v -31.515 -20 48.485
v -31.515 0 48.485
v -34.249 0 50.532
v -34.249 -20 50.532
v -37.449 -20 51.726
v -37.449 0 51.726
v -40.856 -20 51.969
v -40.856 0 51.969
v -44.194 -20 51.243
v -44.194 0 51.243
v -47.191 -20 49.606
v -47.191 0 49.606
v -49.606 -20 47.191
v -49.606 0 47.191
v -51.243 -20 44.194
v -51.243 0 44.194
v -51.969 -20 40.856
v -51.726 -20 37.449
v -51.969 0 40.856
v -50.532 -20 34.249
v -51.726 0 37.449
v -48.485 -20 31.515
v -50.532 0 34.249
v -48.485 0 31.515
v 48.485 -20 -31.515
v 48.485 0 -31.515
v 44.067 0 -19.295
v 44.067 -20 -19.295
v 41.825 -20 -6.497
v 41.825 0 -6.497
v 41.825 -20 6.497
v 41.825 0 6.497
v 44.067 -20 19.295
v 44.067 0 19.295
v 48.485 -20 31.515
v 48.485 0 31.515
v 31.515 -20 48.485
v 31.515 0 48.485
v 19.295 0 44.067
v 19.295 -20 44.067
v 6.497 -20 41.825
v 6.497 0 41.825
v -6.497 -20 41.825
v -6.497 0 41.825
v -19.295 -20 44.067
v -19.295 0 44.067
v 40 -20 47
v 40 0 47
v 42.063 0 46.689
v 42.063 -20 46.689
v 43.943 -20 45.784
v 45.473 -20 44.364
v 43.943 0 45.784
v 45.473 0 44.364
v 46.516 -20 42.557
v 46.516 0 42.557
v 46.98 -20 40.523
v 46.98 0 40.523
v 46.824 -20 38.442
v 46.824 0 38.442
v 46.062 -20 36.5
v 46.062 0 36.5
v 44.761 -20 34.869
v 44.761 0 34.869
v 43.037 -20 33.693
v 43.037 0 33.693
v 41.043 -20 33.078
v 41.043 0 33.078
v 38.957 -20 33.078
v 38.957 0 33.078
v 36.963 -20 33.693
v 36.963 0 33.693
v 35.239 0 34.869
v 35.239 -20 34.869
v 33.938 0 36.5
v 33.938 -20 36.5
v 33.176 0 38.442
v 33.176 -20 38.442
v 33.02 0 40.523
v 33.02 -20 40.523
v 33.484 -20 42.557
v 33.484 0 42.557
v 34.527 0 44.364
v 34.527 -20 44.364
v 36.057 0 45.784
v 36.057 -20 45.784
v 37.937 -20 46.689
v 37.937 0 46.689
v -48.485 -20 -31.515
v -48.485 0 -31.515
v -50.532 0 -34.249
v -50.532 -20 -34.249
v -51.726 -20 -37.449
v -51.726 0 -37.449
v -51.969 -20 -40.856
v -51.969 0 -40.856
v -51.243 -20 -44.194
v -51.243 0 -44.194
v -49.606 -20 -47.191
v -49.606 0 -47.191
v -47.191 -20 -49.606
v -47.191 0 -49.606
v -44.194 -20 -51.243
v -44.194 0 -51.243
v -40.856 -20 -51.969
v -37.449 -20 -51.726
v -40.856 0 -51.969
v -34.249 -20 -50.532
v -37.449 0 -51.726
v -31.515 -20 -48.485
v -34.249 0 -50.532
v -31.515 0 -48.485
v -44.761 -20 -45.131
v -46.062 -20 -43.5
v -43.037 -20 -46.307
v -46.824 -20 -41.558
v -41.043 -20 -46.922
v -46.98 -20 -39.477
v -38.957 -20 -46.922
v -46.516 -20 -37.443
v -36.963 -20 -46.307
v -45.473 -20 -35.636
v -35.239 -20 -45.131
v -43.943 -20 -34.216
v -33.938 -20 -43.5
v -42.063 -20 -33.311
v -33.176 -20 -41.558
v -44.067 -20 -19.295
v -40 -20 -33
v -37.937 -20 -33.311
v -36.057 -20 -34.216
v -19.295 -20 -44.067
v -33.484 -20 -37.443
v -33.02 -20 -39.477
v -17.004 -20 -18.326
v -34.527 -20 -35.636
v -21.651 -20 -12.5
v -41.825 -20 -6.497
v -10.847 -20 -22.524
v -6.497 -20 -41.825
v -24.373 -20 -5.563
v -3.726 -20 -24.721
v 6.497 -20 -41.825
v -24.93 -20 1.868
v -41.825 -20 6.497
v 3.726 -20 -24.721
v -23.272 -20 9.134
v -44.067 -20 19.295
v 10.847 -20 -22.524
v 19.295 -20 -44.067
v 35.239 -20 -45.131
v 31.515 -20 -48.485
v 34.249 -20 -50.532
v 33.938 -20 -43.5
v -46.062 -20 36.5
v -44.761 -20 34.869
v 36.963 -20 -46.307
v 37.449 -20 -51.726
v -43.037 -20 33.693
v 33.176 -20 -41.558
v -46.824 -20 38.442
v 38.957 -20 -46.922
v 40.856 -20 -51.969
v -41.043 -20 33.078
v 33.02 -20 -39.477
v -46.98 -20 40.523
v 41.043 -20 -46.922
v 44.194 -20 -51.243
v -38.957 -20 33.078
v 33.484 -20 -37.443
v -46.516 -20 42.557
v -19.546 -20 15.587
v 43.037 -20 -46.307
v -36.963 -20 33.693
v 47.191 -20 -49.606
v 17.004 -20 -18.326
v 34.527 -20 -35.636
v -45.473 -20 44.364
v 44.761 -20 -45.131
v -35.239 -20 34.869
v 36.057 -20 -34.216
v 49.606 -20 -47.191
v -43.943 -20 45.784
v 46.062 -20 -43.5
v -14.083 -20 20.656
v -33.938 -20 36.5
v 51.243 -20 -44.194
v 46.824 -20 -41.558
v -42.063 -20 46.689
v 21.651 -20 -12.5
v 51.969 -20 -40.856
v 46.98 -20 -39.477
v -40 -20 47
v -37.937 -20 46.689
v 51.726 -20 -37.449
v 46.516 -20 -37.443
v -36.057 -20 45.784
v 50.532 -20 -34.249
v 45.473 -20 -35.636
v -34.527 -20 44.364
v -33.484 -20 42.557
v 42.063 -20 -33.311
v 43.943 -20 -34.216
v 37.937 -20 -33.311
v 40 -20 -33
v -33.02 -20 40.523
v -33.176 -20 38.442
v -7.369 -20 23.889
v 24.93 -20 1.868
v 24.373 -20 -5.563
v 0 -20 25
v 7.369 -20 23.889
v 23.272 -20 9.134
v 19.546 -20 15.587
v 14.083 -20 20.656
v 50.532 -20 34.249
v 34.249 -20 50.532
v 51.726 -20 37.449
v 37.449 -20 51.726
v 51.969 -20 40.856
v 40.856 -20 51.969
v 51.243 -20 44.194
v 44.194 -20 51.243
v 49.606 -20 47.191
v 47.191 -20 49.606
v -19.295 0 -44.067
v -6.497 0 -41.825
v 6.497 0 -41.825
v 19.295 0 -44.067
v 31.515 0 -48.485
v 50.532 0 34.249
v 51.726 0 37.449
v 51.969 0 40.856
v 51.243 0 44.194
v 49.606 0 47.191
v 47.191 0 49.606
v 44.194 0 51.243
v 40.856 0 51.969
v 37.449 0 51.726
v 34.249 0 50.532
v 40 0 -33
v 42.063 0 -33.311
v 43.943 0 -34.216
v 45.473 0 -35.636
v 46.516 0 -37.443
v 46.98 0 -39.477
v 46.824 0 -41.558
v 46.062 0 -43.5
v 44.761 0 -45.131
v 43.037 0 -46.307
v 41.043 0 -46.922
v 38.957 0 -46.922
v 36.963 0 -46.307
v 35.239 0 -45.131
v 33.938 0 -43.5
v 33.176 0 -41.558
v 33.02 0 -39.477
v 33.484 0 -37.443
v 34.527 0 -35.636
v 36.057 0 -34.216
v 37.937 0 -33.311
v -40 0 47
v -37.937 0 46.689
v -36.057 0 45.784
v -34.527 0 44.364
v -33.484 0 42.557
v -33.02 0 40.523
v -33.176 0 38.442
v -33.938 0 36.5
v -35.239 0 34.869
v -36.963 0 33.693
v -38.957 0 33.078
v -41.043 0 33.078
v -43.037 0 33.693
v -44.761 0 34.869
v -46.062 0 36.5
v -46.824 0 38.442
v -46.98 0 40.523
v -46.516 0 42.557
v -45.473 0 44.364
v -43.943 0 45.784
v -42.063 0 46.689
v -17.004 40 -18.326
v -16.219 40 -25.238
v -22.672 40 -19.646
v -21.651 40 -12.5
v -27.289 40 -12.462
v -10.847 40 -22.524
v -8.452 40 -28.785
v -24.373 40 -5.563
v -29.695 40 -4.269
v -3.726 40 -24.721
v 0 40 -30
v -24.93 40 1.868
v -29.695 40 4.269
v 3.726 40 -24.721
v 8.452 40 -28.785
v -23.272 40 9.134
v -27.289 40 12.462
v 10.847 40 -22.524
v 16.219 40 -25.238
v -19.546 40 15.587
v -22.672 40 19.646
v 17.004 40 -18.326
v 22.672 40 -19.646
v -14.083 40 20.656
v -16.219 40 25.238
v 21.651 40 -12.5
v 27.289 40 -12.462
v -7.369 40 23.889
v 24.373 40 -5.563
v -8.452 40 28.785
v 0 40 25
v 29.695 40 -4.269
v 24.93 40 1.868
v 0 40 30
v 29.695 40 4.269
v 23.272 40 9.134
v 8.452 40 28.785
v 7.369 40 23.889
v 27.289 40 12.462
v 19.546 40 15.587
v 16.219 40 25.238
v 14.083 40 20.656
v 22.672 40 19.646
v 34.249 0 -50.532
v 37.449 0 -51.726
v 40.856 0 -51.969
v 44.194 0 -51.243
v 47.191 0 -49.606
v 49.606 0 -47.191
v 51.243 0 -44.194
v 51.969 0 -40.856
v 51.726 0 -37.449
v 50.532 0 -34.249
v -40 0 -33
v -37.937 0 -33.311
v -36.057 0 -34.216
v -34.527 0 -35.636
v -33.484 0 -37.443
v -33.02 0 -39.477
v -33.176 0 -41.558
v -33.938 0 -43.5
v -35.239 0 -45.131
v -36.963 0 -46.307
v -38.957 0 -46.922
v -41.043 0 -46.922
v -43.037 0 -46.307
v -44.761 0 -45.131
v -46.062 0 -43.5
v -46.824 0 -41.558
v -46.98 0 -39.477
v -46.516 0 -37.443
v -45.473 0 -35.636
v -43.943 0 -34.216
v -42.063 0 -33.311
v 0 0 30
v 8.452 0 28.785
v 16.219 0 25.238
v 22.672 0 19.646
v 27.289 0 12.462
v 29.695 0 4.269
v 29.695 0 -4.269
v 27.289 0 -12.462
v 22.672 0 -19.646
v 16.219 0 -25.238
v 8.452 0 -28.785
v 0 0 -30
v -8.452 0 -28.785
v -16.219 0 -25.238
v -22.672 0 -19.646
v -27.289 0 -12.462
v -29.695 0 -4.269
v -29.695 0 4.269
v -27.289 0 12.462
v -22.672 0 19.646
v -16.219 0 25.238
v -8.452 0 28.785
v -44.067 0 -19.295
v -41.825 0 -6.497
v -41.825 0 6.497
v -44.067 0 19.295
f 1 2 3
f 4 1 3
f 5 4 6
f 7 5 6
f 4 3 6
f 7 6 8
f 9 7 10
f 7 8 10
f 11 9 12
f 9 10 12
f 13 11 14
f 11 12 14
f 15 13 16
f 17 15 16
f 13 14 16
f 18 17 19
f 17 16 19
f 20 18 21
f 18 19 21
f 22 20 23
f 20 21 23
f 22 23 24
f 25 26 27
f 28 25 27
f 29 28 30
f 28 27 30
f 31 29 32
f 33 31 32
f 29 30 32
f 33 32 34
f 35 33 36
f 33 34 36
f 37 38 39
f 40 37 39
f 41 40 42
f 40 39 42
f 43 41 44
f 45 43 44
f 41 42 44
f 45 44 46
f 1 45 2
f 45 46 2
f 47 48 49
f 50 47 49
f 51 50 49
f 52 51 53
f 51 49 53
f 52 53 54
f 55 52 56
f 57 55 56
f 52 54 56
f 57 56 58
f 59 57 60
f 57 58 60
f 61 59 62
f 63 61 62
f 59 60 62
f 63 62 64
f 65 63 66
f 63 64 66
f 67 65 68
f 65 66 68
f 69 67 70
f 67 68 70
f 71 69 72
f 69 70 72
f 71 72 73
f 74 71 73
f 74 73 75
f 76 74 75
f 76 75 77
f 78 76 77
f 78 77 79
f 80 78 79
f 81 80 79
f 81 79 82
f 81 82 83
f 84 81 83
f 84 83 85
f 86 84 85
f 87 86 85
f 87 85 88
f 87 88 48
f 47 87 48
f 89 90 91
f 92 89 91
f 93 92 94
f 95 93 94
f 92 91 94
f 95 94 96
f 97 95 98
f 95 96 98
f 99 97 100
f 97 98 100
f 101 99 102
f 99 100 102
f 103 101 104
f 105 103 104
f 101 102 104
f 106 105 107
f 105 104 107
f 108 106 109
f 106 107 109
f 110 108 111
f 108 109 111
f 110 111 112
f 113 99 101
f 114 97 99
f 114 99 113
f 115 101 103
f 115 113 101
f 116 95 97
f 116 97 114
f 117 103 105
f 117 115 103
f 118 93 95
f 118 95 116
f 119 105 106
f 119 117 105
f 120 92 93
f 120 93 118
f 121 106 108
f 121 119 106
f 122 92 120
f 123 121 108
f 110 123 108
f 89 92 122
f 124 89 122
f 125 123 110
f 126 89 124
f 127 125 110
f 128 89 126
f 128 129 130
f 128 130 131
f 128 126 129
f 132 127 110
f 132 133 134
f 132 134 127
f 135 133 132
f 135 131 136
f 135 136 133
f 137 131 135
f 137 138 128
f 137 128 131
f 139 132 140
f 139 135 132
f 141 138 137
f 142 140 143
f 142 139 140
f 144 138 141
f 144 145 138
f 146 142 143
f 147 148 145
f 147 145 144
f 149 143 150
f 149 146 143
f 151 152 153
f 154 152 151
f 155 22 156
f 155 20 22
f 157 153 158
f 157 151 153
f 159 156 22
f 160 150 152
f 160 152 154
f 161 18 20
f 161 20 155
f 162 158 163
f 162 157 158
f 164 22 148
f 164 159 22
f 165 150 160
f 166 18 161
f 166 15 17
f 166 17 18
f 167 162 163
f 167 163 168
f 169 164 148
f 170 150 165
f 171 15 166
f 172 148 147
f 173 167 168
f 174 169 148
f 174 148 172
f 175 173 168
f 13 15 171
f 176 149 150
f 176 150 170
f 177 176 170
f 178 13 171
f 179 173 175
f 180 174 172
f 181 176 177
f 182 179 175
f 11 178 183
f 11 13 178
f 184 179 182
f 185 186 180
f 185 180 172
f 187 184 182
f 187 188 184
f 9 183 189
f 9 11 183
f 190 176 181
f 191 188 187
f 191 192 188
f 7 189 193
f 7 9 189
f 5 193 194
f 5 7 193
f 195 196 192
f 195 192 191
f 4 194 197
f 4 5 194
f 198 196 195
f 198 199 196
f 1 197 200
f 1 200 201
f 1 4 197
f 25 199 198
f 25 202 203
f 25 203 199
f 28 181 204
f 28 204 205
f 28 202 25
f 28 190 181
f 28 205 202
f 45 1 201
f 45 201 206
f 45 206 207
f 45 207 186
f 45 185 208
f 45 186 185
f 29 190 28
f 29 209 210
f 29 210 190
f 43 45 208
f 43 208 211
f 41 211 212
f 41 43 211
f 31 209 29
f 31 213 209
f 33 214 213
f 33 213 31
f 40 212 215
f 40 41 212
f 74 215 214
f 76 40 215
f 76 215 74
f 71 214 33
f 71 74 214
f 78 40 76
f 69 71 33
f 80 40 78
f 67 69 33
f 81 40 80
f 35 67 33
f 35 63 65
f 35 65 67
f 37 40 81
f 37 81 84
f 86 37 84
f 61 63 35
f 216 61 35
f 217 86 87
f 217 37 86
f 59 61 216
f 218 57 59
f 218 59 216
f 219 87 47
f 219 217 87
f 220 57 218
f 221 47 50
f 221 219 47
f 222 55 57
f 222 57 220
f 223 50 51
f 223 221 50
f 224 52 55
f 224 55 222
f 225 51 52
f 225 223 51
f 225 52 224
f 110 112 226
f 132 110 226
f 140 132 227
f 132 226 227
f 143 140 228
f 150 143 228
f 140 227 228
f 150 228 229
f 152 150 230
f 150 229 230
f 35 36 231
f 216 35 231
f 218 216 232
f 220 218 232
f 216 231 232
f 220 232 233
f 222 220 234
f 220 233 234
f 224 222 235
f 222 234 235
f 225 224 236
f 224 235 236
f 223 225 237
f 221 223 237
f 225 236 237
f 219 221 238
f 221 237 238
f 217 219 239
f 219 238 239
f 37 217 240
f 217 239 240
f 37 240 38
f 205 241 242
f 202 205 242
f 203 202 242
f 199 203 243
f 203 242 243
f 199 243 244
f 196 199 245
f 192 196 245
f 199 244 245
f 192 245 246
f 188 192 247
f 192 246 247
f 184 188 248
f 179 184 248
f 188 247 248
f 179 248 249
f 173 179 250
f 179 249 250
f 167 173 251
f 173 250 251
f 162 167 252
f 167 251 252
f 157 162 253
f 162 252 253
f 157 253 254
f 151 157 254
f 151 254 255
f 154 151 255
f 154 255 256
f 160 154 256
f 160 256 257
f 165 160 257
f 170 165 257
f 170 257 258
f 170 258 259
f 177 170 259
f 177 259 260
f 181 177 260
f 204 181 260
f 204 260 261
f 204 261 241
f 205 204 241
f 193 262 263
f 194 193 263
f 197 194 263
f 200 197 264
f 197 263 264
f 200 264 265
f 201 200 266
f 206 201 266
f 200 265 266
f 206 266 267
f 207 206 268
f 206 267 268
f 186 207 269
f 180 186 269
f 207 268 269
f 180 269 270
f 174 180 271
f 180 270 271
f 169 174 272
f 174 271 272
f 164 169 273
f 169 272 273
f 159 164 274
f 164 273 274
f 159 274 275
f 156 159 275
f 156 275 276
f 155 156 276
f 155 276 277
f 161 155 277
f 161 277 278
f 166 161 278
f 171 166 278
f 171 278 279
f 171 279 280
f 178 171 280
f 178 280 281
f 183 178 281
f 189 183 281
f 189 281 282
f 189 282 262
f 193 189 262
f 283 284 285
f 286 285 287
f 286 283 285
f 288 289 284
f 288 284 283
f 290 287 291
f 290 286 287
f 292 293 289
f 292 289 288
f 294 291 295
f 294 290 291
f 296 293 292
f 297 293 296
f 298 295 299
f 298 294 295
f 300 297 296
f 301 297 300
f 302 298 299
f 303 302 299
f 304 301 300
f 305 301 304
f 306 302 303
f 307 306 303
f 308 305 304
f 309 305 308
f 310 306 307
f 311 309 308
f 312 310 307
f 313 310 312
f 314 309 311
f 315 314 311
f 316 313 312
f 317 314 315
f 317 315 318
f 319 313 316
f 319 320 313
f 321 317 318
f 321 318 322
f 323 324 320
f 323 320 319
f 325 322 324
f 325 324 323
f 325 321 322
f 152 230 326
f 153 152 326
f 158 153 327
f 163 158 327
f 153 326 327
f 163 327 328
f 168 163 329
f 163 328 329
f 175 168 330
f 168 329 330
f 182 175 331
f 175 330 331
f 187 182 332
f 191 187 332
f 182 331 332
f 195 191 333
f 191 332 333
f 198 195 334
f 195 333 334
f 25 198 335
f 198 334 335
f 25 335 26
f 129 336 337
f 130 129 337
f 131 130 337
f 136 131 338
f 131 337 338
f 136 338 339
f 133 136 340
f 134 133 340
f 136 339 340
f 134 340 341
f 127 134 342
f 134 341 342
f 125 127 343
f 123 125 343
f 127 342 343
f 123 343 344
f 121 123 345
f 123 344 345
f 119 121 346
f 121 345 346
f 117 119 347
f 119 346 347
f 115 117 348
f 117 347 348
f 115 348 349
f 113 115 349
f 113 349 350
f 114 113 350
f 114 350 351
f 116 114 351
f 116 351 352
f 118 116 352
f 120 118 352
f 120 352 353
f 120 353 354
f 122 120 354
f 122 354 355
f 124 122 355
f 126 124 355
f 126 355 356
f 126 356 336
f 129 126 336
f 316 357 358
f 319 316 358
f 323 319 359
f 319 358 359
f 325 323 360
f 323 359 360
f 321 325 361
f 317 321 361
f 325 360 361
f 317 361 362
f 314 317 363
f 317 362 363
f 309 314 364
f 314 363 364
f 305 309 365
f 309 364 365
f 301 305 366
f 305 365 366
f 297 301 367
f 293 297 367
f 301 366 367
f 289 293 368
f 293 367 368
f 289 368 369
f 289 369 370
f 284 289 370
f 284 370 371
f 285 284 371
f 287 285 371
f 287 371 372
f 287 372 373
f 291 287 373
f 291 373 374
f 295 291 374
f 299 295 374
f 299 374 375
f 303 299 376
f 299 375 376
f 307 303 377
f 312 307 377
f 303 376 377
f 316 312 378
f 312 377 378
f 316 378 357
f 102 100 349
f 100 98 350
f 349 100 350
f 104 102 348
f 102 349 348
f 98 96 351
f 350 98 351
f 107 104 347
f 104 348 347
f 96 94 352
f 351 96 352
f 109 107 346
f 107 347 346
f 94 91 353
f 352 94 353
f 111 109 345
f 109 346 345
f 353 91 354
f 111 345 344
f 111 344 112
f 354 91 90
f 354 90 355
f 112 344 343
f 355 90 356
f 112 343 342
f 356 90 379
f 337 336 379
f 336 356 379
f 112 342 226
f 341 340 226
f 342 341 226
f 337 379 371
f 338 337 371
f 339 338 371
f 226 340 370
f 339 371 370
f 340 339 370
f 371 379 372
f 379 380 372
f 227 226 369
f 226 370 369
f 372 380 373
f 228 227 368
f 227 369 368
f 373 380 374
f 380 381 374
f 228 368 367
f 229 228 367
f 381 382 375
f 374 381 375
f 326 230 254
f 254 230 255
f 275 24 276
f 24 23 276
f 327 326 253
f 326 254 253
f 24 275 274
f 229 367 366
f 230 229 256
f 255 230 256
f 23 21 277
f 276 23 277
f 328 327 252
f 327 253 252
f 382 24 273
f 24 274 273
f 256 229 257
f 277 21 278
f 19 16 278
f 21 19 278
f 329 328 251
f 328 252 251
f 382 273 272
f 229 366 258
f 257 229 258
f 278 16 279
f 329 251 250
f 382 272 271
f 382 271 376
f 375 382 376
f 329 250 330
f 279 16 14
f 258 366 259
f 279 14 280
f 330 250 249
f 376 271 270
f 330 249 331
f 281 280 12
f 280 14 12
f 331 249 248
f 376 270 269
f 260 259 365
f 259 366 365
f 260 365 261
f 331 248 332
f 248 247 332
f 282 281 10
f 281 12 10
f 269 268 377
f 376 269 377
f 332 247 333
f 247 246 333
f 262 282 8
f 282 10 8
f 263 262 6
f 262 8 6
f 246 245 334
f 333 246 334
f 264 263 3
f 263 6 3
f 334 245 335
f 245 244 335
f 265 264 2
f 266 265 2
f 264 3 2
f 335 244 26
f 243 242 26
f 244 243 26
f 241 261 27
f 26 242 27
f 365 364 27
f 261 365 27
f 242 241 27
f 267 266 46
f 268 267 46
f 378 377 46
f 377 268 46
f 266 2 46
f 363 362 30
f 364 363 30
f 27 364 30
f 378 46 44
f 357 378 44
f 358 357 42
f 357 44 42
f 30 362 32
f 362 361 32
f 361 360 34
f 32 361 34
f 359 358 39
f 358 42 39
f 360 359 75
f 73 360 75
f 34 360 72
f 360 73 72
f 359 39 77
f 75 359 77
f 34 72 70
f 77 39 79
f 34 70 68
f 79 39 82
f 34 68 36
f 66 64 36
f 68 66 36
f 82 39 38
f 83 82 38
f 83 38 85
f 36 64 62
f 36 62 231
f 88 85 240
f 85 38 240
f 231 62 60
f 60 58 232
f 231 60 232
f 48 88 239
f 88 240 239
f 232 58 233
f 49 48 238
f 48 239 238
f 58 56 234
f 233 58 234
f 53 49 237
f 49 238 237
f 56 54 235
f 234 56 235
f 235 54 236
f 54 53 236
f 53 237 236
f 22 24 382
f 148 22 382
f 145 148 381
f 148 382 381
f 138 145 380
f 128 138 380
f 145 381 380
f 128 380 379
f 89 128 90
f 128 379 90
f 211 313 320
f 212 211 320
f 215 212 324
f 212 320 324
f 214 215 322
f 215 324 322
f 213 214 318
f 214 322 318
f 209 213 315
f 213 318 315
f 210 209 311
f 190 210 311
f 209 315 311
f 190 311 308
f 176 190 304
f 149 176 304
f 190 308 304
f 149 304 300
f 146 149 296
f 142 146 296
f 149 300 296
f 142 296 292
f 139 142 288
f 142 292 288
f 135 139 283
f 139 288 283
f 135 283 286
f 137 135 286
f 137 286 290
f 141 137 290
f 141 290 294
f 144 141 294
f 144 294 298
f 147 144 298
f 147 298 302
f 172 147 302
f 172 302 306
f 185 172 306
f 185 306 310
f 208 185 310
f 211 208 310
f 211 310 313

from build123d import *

# Parameters (mm, degrees)
SKETCH1_R           = 30
BOSS_EXTRUDE1_DEPTH = 40
BOSS_EXTRUDE2_DEPTH = 20
SKETCH4_R           = 7
CUT_EXTRUDE2_DEPTH  = 84.713798146
SKETCH2_R           = 25
CUT_EXTRUDE1_DEPTH  = 95.910484142


with BuildPart() as part:
    # Sketch1 → Boss-Extrude1 (new body)
    with BuildSketch(Plane(origin=(0, 0, 0), x_dir=(1, 0, 0), z_dir=(0, 1, 0))):
        with Locations(Location((0, 0, 0), (0, 0, 270))):
            Circle(SKETCH1_R)
    extrude(amount=BOSS_EXTRUDE1_DEPTH)

    # Sketch3 → Boss-Extrude2 (add)
    with BuildSketch(Plane.XZ):
        with BuildLine():
            ThreePointArc((-48.485281374, -31.514718626), (-48.485281374, -48.485281374), (-31.514718626, -48.485281374))
            ThreePointArc((-31.514718626, -48.485281374), (0, -41.542775524), (31.514718626, -48.485281374))
            ThreePointArc((31.514718626, -48.485281374), (48.485281374, -48.485281374), (48.485281374, -31.514718626))
            ThreePointArc((48.485281374, -31.514718626), (41.542775524, 0), (48.485281374, 31.514718626))
            ThreePointArc((48.485281374, 31.514718626), (48.485281374, 48.485281374), (31.514718626, 48.485281374))
            ThreePointArc((31.514718626, 48.485281374), (0, 41.542775524), (-31.514718626, 48.485281374))
            ThreePointArc((-31.514718626, 48.485281374), (-48.485281374, 48.485281374), (-48.485281374, 31.514718626))
            ThreePointArc((-48.485281374, 31.514718626), (-41.542775524, 0), (-48.485281374, -31.514718626))
        make_face()
    extrude(amount=BOSS_EXTRUDE2_DEPTH)

    # Sketch4 → Cut-Extrude2 (cut, through all)
    with BuildSketch(Plane(origin=(0, 0, 0), x_dir=(1, 0, 0), z_dir=(0, 1, 0))):
        with Locations(Location((-40, 40, 0), (0, 0, 270))):
            Circle(SKETCH4_R)
        with Locations(Location((40, -40, 0), (0, 0, 270))):
            Circle(SKETCH4_R)
        with Locations(Location((40, 40, 0), (0, 0, 270))):
            Circle(SKETCH4_R)
        with Locations(Location((-40, -40, 0), (0, 0, 270))):
            Circle(SKETCH4_R)
    extrude(amount=-CUT_EXTRUDE2_DEPTH, mode=Mode.SUBTRACT)

    # Sketch2 → Cut-Extrude1 (cut, through all)
    with BuildSketch(Plane(origin=(0, 40, 0), x_dir=(1, 0, 0), z_dir=(0, 1, 0))):
        with Locations(Location((0, 0, 0), (0, 0, 270))):
            Circle(SKETCH2_R)
    extrude(amount=-CUT_EXTRUDE1_DEPTH, mode=Mode.SUBTRACT)


solid = part.part
